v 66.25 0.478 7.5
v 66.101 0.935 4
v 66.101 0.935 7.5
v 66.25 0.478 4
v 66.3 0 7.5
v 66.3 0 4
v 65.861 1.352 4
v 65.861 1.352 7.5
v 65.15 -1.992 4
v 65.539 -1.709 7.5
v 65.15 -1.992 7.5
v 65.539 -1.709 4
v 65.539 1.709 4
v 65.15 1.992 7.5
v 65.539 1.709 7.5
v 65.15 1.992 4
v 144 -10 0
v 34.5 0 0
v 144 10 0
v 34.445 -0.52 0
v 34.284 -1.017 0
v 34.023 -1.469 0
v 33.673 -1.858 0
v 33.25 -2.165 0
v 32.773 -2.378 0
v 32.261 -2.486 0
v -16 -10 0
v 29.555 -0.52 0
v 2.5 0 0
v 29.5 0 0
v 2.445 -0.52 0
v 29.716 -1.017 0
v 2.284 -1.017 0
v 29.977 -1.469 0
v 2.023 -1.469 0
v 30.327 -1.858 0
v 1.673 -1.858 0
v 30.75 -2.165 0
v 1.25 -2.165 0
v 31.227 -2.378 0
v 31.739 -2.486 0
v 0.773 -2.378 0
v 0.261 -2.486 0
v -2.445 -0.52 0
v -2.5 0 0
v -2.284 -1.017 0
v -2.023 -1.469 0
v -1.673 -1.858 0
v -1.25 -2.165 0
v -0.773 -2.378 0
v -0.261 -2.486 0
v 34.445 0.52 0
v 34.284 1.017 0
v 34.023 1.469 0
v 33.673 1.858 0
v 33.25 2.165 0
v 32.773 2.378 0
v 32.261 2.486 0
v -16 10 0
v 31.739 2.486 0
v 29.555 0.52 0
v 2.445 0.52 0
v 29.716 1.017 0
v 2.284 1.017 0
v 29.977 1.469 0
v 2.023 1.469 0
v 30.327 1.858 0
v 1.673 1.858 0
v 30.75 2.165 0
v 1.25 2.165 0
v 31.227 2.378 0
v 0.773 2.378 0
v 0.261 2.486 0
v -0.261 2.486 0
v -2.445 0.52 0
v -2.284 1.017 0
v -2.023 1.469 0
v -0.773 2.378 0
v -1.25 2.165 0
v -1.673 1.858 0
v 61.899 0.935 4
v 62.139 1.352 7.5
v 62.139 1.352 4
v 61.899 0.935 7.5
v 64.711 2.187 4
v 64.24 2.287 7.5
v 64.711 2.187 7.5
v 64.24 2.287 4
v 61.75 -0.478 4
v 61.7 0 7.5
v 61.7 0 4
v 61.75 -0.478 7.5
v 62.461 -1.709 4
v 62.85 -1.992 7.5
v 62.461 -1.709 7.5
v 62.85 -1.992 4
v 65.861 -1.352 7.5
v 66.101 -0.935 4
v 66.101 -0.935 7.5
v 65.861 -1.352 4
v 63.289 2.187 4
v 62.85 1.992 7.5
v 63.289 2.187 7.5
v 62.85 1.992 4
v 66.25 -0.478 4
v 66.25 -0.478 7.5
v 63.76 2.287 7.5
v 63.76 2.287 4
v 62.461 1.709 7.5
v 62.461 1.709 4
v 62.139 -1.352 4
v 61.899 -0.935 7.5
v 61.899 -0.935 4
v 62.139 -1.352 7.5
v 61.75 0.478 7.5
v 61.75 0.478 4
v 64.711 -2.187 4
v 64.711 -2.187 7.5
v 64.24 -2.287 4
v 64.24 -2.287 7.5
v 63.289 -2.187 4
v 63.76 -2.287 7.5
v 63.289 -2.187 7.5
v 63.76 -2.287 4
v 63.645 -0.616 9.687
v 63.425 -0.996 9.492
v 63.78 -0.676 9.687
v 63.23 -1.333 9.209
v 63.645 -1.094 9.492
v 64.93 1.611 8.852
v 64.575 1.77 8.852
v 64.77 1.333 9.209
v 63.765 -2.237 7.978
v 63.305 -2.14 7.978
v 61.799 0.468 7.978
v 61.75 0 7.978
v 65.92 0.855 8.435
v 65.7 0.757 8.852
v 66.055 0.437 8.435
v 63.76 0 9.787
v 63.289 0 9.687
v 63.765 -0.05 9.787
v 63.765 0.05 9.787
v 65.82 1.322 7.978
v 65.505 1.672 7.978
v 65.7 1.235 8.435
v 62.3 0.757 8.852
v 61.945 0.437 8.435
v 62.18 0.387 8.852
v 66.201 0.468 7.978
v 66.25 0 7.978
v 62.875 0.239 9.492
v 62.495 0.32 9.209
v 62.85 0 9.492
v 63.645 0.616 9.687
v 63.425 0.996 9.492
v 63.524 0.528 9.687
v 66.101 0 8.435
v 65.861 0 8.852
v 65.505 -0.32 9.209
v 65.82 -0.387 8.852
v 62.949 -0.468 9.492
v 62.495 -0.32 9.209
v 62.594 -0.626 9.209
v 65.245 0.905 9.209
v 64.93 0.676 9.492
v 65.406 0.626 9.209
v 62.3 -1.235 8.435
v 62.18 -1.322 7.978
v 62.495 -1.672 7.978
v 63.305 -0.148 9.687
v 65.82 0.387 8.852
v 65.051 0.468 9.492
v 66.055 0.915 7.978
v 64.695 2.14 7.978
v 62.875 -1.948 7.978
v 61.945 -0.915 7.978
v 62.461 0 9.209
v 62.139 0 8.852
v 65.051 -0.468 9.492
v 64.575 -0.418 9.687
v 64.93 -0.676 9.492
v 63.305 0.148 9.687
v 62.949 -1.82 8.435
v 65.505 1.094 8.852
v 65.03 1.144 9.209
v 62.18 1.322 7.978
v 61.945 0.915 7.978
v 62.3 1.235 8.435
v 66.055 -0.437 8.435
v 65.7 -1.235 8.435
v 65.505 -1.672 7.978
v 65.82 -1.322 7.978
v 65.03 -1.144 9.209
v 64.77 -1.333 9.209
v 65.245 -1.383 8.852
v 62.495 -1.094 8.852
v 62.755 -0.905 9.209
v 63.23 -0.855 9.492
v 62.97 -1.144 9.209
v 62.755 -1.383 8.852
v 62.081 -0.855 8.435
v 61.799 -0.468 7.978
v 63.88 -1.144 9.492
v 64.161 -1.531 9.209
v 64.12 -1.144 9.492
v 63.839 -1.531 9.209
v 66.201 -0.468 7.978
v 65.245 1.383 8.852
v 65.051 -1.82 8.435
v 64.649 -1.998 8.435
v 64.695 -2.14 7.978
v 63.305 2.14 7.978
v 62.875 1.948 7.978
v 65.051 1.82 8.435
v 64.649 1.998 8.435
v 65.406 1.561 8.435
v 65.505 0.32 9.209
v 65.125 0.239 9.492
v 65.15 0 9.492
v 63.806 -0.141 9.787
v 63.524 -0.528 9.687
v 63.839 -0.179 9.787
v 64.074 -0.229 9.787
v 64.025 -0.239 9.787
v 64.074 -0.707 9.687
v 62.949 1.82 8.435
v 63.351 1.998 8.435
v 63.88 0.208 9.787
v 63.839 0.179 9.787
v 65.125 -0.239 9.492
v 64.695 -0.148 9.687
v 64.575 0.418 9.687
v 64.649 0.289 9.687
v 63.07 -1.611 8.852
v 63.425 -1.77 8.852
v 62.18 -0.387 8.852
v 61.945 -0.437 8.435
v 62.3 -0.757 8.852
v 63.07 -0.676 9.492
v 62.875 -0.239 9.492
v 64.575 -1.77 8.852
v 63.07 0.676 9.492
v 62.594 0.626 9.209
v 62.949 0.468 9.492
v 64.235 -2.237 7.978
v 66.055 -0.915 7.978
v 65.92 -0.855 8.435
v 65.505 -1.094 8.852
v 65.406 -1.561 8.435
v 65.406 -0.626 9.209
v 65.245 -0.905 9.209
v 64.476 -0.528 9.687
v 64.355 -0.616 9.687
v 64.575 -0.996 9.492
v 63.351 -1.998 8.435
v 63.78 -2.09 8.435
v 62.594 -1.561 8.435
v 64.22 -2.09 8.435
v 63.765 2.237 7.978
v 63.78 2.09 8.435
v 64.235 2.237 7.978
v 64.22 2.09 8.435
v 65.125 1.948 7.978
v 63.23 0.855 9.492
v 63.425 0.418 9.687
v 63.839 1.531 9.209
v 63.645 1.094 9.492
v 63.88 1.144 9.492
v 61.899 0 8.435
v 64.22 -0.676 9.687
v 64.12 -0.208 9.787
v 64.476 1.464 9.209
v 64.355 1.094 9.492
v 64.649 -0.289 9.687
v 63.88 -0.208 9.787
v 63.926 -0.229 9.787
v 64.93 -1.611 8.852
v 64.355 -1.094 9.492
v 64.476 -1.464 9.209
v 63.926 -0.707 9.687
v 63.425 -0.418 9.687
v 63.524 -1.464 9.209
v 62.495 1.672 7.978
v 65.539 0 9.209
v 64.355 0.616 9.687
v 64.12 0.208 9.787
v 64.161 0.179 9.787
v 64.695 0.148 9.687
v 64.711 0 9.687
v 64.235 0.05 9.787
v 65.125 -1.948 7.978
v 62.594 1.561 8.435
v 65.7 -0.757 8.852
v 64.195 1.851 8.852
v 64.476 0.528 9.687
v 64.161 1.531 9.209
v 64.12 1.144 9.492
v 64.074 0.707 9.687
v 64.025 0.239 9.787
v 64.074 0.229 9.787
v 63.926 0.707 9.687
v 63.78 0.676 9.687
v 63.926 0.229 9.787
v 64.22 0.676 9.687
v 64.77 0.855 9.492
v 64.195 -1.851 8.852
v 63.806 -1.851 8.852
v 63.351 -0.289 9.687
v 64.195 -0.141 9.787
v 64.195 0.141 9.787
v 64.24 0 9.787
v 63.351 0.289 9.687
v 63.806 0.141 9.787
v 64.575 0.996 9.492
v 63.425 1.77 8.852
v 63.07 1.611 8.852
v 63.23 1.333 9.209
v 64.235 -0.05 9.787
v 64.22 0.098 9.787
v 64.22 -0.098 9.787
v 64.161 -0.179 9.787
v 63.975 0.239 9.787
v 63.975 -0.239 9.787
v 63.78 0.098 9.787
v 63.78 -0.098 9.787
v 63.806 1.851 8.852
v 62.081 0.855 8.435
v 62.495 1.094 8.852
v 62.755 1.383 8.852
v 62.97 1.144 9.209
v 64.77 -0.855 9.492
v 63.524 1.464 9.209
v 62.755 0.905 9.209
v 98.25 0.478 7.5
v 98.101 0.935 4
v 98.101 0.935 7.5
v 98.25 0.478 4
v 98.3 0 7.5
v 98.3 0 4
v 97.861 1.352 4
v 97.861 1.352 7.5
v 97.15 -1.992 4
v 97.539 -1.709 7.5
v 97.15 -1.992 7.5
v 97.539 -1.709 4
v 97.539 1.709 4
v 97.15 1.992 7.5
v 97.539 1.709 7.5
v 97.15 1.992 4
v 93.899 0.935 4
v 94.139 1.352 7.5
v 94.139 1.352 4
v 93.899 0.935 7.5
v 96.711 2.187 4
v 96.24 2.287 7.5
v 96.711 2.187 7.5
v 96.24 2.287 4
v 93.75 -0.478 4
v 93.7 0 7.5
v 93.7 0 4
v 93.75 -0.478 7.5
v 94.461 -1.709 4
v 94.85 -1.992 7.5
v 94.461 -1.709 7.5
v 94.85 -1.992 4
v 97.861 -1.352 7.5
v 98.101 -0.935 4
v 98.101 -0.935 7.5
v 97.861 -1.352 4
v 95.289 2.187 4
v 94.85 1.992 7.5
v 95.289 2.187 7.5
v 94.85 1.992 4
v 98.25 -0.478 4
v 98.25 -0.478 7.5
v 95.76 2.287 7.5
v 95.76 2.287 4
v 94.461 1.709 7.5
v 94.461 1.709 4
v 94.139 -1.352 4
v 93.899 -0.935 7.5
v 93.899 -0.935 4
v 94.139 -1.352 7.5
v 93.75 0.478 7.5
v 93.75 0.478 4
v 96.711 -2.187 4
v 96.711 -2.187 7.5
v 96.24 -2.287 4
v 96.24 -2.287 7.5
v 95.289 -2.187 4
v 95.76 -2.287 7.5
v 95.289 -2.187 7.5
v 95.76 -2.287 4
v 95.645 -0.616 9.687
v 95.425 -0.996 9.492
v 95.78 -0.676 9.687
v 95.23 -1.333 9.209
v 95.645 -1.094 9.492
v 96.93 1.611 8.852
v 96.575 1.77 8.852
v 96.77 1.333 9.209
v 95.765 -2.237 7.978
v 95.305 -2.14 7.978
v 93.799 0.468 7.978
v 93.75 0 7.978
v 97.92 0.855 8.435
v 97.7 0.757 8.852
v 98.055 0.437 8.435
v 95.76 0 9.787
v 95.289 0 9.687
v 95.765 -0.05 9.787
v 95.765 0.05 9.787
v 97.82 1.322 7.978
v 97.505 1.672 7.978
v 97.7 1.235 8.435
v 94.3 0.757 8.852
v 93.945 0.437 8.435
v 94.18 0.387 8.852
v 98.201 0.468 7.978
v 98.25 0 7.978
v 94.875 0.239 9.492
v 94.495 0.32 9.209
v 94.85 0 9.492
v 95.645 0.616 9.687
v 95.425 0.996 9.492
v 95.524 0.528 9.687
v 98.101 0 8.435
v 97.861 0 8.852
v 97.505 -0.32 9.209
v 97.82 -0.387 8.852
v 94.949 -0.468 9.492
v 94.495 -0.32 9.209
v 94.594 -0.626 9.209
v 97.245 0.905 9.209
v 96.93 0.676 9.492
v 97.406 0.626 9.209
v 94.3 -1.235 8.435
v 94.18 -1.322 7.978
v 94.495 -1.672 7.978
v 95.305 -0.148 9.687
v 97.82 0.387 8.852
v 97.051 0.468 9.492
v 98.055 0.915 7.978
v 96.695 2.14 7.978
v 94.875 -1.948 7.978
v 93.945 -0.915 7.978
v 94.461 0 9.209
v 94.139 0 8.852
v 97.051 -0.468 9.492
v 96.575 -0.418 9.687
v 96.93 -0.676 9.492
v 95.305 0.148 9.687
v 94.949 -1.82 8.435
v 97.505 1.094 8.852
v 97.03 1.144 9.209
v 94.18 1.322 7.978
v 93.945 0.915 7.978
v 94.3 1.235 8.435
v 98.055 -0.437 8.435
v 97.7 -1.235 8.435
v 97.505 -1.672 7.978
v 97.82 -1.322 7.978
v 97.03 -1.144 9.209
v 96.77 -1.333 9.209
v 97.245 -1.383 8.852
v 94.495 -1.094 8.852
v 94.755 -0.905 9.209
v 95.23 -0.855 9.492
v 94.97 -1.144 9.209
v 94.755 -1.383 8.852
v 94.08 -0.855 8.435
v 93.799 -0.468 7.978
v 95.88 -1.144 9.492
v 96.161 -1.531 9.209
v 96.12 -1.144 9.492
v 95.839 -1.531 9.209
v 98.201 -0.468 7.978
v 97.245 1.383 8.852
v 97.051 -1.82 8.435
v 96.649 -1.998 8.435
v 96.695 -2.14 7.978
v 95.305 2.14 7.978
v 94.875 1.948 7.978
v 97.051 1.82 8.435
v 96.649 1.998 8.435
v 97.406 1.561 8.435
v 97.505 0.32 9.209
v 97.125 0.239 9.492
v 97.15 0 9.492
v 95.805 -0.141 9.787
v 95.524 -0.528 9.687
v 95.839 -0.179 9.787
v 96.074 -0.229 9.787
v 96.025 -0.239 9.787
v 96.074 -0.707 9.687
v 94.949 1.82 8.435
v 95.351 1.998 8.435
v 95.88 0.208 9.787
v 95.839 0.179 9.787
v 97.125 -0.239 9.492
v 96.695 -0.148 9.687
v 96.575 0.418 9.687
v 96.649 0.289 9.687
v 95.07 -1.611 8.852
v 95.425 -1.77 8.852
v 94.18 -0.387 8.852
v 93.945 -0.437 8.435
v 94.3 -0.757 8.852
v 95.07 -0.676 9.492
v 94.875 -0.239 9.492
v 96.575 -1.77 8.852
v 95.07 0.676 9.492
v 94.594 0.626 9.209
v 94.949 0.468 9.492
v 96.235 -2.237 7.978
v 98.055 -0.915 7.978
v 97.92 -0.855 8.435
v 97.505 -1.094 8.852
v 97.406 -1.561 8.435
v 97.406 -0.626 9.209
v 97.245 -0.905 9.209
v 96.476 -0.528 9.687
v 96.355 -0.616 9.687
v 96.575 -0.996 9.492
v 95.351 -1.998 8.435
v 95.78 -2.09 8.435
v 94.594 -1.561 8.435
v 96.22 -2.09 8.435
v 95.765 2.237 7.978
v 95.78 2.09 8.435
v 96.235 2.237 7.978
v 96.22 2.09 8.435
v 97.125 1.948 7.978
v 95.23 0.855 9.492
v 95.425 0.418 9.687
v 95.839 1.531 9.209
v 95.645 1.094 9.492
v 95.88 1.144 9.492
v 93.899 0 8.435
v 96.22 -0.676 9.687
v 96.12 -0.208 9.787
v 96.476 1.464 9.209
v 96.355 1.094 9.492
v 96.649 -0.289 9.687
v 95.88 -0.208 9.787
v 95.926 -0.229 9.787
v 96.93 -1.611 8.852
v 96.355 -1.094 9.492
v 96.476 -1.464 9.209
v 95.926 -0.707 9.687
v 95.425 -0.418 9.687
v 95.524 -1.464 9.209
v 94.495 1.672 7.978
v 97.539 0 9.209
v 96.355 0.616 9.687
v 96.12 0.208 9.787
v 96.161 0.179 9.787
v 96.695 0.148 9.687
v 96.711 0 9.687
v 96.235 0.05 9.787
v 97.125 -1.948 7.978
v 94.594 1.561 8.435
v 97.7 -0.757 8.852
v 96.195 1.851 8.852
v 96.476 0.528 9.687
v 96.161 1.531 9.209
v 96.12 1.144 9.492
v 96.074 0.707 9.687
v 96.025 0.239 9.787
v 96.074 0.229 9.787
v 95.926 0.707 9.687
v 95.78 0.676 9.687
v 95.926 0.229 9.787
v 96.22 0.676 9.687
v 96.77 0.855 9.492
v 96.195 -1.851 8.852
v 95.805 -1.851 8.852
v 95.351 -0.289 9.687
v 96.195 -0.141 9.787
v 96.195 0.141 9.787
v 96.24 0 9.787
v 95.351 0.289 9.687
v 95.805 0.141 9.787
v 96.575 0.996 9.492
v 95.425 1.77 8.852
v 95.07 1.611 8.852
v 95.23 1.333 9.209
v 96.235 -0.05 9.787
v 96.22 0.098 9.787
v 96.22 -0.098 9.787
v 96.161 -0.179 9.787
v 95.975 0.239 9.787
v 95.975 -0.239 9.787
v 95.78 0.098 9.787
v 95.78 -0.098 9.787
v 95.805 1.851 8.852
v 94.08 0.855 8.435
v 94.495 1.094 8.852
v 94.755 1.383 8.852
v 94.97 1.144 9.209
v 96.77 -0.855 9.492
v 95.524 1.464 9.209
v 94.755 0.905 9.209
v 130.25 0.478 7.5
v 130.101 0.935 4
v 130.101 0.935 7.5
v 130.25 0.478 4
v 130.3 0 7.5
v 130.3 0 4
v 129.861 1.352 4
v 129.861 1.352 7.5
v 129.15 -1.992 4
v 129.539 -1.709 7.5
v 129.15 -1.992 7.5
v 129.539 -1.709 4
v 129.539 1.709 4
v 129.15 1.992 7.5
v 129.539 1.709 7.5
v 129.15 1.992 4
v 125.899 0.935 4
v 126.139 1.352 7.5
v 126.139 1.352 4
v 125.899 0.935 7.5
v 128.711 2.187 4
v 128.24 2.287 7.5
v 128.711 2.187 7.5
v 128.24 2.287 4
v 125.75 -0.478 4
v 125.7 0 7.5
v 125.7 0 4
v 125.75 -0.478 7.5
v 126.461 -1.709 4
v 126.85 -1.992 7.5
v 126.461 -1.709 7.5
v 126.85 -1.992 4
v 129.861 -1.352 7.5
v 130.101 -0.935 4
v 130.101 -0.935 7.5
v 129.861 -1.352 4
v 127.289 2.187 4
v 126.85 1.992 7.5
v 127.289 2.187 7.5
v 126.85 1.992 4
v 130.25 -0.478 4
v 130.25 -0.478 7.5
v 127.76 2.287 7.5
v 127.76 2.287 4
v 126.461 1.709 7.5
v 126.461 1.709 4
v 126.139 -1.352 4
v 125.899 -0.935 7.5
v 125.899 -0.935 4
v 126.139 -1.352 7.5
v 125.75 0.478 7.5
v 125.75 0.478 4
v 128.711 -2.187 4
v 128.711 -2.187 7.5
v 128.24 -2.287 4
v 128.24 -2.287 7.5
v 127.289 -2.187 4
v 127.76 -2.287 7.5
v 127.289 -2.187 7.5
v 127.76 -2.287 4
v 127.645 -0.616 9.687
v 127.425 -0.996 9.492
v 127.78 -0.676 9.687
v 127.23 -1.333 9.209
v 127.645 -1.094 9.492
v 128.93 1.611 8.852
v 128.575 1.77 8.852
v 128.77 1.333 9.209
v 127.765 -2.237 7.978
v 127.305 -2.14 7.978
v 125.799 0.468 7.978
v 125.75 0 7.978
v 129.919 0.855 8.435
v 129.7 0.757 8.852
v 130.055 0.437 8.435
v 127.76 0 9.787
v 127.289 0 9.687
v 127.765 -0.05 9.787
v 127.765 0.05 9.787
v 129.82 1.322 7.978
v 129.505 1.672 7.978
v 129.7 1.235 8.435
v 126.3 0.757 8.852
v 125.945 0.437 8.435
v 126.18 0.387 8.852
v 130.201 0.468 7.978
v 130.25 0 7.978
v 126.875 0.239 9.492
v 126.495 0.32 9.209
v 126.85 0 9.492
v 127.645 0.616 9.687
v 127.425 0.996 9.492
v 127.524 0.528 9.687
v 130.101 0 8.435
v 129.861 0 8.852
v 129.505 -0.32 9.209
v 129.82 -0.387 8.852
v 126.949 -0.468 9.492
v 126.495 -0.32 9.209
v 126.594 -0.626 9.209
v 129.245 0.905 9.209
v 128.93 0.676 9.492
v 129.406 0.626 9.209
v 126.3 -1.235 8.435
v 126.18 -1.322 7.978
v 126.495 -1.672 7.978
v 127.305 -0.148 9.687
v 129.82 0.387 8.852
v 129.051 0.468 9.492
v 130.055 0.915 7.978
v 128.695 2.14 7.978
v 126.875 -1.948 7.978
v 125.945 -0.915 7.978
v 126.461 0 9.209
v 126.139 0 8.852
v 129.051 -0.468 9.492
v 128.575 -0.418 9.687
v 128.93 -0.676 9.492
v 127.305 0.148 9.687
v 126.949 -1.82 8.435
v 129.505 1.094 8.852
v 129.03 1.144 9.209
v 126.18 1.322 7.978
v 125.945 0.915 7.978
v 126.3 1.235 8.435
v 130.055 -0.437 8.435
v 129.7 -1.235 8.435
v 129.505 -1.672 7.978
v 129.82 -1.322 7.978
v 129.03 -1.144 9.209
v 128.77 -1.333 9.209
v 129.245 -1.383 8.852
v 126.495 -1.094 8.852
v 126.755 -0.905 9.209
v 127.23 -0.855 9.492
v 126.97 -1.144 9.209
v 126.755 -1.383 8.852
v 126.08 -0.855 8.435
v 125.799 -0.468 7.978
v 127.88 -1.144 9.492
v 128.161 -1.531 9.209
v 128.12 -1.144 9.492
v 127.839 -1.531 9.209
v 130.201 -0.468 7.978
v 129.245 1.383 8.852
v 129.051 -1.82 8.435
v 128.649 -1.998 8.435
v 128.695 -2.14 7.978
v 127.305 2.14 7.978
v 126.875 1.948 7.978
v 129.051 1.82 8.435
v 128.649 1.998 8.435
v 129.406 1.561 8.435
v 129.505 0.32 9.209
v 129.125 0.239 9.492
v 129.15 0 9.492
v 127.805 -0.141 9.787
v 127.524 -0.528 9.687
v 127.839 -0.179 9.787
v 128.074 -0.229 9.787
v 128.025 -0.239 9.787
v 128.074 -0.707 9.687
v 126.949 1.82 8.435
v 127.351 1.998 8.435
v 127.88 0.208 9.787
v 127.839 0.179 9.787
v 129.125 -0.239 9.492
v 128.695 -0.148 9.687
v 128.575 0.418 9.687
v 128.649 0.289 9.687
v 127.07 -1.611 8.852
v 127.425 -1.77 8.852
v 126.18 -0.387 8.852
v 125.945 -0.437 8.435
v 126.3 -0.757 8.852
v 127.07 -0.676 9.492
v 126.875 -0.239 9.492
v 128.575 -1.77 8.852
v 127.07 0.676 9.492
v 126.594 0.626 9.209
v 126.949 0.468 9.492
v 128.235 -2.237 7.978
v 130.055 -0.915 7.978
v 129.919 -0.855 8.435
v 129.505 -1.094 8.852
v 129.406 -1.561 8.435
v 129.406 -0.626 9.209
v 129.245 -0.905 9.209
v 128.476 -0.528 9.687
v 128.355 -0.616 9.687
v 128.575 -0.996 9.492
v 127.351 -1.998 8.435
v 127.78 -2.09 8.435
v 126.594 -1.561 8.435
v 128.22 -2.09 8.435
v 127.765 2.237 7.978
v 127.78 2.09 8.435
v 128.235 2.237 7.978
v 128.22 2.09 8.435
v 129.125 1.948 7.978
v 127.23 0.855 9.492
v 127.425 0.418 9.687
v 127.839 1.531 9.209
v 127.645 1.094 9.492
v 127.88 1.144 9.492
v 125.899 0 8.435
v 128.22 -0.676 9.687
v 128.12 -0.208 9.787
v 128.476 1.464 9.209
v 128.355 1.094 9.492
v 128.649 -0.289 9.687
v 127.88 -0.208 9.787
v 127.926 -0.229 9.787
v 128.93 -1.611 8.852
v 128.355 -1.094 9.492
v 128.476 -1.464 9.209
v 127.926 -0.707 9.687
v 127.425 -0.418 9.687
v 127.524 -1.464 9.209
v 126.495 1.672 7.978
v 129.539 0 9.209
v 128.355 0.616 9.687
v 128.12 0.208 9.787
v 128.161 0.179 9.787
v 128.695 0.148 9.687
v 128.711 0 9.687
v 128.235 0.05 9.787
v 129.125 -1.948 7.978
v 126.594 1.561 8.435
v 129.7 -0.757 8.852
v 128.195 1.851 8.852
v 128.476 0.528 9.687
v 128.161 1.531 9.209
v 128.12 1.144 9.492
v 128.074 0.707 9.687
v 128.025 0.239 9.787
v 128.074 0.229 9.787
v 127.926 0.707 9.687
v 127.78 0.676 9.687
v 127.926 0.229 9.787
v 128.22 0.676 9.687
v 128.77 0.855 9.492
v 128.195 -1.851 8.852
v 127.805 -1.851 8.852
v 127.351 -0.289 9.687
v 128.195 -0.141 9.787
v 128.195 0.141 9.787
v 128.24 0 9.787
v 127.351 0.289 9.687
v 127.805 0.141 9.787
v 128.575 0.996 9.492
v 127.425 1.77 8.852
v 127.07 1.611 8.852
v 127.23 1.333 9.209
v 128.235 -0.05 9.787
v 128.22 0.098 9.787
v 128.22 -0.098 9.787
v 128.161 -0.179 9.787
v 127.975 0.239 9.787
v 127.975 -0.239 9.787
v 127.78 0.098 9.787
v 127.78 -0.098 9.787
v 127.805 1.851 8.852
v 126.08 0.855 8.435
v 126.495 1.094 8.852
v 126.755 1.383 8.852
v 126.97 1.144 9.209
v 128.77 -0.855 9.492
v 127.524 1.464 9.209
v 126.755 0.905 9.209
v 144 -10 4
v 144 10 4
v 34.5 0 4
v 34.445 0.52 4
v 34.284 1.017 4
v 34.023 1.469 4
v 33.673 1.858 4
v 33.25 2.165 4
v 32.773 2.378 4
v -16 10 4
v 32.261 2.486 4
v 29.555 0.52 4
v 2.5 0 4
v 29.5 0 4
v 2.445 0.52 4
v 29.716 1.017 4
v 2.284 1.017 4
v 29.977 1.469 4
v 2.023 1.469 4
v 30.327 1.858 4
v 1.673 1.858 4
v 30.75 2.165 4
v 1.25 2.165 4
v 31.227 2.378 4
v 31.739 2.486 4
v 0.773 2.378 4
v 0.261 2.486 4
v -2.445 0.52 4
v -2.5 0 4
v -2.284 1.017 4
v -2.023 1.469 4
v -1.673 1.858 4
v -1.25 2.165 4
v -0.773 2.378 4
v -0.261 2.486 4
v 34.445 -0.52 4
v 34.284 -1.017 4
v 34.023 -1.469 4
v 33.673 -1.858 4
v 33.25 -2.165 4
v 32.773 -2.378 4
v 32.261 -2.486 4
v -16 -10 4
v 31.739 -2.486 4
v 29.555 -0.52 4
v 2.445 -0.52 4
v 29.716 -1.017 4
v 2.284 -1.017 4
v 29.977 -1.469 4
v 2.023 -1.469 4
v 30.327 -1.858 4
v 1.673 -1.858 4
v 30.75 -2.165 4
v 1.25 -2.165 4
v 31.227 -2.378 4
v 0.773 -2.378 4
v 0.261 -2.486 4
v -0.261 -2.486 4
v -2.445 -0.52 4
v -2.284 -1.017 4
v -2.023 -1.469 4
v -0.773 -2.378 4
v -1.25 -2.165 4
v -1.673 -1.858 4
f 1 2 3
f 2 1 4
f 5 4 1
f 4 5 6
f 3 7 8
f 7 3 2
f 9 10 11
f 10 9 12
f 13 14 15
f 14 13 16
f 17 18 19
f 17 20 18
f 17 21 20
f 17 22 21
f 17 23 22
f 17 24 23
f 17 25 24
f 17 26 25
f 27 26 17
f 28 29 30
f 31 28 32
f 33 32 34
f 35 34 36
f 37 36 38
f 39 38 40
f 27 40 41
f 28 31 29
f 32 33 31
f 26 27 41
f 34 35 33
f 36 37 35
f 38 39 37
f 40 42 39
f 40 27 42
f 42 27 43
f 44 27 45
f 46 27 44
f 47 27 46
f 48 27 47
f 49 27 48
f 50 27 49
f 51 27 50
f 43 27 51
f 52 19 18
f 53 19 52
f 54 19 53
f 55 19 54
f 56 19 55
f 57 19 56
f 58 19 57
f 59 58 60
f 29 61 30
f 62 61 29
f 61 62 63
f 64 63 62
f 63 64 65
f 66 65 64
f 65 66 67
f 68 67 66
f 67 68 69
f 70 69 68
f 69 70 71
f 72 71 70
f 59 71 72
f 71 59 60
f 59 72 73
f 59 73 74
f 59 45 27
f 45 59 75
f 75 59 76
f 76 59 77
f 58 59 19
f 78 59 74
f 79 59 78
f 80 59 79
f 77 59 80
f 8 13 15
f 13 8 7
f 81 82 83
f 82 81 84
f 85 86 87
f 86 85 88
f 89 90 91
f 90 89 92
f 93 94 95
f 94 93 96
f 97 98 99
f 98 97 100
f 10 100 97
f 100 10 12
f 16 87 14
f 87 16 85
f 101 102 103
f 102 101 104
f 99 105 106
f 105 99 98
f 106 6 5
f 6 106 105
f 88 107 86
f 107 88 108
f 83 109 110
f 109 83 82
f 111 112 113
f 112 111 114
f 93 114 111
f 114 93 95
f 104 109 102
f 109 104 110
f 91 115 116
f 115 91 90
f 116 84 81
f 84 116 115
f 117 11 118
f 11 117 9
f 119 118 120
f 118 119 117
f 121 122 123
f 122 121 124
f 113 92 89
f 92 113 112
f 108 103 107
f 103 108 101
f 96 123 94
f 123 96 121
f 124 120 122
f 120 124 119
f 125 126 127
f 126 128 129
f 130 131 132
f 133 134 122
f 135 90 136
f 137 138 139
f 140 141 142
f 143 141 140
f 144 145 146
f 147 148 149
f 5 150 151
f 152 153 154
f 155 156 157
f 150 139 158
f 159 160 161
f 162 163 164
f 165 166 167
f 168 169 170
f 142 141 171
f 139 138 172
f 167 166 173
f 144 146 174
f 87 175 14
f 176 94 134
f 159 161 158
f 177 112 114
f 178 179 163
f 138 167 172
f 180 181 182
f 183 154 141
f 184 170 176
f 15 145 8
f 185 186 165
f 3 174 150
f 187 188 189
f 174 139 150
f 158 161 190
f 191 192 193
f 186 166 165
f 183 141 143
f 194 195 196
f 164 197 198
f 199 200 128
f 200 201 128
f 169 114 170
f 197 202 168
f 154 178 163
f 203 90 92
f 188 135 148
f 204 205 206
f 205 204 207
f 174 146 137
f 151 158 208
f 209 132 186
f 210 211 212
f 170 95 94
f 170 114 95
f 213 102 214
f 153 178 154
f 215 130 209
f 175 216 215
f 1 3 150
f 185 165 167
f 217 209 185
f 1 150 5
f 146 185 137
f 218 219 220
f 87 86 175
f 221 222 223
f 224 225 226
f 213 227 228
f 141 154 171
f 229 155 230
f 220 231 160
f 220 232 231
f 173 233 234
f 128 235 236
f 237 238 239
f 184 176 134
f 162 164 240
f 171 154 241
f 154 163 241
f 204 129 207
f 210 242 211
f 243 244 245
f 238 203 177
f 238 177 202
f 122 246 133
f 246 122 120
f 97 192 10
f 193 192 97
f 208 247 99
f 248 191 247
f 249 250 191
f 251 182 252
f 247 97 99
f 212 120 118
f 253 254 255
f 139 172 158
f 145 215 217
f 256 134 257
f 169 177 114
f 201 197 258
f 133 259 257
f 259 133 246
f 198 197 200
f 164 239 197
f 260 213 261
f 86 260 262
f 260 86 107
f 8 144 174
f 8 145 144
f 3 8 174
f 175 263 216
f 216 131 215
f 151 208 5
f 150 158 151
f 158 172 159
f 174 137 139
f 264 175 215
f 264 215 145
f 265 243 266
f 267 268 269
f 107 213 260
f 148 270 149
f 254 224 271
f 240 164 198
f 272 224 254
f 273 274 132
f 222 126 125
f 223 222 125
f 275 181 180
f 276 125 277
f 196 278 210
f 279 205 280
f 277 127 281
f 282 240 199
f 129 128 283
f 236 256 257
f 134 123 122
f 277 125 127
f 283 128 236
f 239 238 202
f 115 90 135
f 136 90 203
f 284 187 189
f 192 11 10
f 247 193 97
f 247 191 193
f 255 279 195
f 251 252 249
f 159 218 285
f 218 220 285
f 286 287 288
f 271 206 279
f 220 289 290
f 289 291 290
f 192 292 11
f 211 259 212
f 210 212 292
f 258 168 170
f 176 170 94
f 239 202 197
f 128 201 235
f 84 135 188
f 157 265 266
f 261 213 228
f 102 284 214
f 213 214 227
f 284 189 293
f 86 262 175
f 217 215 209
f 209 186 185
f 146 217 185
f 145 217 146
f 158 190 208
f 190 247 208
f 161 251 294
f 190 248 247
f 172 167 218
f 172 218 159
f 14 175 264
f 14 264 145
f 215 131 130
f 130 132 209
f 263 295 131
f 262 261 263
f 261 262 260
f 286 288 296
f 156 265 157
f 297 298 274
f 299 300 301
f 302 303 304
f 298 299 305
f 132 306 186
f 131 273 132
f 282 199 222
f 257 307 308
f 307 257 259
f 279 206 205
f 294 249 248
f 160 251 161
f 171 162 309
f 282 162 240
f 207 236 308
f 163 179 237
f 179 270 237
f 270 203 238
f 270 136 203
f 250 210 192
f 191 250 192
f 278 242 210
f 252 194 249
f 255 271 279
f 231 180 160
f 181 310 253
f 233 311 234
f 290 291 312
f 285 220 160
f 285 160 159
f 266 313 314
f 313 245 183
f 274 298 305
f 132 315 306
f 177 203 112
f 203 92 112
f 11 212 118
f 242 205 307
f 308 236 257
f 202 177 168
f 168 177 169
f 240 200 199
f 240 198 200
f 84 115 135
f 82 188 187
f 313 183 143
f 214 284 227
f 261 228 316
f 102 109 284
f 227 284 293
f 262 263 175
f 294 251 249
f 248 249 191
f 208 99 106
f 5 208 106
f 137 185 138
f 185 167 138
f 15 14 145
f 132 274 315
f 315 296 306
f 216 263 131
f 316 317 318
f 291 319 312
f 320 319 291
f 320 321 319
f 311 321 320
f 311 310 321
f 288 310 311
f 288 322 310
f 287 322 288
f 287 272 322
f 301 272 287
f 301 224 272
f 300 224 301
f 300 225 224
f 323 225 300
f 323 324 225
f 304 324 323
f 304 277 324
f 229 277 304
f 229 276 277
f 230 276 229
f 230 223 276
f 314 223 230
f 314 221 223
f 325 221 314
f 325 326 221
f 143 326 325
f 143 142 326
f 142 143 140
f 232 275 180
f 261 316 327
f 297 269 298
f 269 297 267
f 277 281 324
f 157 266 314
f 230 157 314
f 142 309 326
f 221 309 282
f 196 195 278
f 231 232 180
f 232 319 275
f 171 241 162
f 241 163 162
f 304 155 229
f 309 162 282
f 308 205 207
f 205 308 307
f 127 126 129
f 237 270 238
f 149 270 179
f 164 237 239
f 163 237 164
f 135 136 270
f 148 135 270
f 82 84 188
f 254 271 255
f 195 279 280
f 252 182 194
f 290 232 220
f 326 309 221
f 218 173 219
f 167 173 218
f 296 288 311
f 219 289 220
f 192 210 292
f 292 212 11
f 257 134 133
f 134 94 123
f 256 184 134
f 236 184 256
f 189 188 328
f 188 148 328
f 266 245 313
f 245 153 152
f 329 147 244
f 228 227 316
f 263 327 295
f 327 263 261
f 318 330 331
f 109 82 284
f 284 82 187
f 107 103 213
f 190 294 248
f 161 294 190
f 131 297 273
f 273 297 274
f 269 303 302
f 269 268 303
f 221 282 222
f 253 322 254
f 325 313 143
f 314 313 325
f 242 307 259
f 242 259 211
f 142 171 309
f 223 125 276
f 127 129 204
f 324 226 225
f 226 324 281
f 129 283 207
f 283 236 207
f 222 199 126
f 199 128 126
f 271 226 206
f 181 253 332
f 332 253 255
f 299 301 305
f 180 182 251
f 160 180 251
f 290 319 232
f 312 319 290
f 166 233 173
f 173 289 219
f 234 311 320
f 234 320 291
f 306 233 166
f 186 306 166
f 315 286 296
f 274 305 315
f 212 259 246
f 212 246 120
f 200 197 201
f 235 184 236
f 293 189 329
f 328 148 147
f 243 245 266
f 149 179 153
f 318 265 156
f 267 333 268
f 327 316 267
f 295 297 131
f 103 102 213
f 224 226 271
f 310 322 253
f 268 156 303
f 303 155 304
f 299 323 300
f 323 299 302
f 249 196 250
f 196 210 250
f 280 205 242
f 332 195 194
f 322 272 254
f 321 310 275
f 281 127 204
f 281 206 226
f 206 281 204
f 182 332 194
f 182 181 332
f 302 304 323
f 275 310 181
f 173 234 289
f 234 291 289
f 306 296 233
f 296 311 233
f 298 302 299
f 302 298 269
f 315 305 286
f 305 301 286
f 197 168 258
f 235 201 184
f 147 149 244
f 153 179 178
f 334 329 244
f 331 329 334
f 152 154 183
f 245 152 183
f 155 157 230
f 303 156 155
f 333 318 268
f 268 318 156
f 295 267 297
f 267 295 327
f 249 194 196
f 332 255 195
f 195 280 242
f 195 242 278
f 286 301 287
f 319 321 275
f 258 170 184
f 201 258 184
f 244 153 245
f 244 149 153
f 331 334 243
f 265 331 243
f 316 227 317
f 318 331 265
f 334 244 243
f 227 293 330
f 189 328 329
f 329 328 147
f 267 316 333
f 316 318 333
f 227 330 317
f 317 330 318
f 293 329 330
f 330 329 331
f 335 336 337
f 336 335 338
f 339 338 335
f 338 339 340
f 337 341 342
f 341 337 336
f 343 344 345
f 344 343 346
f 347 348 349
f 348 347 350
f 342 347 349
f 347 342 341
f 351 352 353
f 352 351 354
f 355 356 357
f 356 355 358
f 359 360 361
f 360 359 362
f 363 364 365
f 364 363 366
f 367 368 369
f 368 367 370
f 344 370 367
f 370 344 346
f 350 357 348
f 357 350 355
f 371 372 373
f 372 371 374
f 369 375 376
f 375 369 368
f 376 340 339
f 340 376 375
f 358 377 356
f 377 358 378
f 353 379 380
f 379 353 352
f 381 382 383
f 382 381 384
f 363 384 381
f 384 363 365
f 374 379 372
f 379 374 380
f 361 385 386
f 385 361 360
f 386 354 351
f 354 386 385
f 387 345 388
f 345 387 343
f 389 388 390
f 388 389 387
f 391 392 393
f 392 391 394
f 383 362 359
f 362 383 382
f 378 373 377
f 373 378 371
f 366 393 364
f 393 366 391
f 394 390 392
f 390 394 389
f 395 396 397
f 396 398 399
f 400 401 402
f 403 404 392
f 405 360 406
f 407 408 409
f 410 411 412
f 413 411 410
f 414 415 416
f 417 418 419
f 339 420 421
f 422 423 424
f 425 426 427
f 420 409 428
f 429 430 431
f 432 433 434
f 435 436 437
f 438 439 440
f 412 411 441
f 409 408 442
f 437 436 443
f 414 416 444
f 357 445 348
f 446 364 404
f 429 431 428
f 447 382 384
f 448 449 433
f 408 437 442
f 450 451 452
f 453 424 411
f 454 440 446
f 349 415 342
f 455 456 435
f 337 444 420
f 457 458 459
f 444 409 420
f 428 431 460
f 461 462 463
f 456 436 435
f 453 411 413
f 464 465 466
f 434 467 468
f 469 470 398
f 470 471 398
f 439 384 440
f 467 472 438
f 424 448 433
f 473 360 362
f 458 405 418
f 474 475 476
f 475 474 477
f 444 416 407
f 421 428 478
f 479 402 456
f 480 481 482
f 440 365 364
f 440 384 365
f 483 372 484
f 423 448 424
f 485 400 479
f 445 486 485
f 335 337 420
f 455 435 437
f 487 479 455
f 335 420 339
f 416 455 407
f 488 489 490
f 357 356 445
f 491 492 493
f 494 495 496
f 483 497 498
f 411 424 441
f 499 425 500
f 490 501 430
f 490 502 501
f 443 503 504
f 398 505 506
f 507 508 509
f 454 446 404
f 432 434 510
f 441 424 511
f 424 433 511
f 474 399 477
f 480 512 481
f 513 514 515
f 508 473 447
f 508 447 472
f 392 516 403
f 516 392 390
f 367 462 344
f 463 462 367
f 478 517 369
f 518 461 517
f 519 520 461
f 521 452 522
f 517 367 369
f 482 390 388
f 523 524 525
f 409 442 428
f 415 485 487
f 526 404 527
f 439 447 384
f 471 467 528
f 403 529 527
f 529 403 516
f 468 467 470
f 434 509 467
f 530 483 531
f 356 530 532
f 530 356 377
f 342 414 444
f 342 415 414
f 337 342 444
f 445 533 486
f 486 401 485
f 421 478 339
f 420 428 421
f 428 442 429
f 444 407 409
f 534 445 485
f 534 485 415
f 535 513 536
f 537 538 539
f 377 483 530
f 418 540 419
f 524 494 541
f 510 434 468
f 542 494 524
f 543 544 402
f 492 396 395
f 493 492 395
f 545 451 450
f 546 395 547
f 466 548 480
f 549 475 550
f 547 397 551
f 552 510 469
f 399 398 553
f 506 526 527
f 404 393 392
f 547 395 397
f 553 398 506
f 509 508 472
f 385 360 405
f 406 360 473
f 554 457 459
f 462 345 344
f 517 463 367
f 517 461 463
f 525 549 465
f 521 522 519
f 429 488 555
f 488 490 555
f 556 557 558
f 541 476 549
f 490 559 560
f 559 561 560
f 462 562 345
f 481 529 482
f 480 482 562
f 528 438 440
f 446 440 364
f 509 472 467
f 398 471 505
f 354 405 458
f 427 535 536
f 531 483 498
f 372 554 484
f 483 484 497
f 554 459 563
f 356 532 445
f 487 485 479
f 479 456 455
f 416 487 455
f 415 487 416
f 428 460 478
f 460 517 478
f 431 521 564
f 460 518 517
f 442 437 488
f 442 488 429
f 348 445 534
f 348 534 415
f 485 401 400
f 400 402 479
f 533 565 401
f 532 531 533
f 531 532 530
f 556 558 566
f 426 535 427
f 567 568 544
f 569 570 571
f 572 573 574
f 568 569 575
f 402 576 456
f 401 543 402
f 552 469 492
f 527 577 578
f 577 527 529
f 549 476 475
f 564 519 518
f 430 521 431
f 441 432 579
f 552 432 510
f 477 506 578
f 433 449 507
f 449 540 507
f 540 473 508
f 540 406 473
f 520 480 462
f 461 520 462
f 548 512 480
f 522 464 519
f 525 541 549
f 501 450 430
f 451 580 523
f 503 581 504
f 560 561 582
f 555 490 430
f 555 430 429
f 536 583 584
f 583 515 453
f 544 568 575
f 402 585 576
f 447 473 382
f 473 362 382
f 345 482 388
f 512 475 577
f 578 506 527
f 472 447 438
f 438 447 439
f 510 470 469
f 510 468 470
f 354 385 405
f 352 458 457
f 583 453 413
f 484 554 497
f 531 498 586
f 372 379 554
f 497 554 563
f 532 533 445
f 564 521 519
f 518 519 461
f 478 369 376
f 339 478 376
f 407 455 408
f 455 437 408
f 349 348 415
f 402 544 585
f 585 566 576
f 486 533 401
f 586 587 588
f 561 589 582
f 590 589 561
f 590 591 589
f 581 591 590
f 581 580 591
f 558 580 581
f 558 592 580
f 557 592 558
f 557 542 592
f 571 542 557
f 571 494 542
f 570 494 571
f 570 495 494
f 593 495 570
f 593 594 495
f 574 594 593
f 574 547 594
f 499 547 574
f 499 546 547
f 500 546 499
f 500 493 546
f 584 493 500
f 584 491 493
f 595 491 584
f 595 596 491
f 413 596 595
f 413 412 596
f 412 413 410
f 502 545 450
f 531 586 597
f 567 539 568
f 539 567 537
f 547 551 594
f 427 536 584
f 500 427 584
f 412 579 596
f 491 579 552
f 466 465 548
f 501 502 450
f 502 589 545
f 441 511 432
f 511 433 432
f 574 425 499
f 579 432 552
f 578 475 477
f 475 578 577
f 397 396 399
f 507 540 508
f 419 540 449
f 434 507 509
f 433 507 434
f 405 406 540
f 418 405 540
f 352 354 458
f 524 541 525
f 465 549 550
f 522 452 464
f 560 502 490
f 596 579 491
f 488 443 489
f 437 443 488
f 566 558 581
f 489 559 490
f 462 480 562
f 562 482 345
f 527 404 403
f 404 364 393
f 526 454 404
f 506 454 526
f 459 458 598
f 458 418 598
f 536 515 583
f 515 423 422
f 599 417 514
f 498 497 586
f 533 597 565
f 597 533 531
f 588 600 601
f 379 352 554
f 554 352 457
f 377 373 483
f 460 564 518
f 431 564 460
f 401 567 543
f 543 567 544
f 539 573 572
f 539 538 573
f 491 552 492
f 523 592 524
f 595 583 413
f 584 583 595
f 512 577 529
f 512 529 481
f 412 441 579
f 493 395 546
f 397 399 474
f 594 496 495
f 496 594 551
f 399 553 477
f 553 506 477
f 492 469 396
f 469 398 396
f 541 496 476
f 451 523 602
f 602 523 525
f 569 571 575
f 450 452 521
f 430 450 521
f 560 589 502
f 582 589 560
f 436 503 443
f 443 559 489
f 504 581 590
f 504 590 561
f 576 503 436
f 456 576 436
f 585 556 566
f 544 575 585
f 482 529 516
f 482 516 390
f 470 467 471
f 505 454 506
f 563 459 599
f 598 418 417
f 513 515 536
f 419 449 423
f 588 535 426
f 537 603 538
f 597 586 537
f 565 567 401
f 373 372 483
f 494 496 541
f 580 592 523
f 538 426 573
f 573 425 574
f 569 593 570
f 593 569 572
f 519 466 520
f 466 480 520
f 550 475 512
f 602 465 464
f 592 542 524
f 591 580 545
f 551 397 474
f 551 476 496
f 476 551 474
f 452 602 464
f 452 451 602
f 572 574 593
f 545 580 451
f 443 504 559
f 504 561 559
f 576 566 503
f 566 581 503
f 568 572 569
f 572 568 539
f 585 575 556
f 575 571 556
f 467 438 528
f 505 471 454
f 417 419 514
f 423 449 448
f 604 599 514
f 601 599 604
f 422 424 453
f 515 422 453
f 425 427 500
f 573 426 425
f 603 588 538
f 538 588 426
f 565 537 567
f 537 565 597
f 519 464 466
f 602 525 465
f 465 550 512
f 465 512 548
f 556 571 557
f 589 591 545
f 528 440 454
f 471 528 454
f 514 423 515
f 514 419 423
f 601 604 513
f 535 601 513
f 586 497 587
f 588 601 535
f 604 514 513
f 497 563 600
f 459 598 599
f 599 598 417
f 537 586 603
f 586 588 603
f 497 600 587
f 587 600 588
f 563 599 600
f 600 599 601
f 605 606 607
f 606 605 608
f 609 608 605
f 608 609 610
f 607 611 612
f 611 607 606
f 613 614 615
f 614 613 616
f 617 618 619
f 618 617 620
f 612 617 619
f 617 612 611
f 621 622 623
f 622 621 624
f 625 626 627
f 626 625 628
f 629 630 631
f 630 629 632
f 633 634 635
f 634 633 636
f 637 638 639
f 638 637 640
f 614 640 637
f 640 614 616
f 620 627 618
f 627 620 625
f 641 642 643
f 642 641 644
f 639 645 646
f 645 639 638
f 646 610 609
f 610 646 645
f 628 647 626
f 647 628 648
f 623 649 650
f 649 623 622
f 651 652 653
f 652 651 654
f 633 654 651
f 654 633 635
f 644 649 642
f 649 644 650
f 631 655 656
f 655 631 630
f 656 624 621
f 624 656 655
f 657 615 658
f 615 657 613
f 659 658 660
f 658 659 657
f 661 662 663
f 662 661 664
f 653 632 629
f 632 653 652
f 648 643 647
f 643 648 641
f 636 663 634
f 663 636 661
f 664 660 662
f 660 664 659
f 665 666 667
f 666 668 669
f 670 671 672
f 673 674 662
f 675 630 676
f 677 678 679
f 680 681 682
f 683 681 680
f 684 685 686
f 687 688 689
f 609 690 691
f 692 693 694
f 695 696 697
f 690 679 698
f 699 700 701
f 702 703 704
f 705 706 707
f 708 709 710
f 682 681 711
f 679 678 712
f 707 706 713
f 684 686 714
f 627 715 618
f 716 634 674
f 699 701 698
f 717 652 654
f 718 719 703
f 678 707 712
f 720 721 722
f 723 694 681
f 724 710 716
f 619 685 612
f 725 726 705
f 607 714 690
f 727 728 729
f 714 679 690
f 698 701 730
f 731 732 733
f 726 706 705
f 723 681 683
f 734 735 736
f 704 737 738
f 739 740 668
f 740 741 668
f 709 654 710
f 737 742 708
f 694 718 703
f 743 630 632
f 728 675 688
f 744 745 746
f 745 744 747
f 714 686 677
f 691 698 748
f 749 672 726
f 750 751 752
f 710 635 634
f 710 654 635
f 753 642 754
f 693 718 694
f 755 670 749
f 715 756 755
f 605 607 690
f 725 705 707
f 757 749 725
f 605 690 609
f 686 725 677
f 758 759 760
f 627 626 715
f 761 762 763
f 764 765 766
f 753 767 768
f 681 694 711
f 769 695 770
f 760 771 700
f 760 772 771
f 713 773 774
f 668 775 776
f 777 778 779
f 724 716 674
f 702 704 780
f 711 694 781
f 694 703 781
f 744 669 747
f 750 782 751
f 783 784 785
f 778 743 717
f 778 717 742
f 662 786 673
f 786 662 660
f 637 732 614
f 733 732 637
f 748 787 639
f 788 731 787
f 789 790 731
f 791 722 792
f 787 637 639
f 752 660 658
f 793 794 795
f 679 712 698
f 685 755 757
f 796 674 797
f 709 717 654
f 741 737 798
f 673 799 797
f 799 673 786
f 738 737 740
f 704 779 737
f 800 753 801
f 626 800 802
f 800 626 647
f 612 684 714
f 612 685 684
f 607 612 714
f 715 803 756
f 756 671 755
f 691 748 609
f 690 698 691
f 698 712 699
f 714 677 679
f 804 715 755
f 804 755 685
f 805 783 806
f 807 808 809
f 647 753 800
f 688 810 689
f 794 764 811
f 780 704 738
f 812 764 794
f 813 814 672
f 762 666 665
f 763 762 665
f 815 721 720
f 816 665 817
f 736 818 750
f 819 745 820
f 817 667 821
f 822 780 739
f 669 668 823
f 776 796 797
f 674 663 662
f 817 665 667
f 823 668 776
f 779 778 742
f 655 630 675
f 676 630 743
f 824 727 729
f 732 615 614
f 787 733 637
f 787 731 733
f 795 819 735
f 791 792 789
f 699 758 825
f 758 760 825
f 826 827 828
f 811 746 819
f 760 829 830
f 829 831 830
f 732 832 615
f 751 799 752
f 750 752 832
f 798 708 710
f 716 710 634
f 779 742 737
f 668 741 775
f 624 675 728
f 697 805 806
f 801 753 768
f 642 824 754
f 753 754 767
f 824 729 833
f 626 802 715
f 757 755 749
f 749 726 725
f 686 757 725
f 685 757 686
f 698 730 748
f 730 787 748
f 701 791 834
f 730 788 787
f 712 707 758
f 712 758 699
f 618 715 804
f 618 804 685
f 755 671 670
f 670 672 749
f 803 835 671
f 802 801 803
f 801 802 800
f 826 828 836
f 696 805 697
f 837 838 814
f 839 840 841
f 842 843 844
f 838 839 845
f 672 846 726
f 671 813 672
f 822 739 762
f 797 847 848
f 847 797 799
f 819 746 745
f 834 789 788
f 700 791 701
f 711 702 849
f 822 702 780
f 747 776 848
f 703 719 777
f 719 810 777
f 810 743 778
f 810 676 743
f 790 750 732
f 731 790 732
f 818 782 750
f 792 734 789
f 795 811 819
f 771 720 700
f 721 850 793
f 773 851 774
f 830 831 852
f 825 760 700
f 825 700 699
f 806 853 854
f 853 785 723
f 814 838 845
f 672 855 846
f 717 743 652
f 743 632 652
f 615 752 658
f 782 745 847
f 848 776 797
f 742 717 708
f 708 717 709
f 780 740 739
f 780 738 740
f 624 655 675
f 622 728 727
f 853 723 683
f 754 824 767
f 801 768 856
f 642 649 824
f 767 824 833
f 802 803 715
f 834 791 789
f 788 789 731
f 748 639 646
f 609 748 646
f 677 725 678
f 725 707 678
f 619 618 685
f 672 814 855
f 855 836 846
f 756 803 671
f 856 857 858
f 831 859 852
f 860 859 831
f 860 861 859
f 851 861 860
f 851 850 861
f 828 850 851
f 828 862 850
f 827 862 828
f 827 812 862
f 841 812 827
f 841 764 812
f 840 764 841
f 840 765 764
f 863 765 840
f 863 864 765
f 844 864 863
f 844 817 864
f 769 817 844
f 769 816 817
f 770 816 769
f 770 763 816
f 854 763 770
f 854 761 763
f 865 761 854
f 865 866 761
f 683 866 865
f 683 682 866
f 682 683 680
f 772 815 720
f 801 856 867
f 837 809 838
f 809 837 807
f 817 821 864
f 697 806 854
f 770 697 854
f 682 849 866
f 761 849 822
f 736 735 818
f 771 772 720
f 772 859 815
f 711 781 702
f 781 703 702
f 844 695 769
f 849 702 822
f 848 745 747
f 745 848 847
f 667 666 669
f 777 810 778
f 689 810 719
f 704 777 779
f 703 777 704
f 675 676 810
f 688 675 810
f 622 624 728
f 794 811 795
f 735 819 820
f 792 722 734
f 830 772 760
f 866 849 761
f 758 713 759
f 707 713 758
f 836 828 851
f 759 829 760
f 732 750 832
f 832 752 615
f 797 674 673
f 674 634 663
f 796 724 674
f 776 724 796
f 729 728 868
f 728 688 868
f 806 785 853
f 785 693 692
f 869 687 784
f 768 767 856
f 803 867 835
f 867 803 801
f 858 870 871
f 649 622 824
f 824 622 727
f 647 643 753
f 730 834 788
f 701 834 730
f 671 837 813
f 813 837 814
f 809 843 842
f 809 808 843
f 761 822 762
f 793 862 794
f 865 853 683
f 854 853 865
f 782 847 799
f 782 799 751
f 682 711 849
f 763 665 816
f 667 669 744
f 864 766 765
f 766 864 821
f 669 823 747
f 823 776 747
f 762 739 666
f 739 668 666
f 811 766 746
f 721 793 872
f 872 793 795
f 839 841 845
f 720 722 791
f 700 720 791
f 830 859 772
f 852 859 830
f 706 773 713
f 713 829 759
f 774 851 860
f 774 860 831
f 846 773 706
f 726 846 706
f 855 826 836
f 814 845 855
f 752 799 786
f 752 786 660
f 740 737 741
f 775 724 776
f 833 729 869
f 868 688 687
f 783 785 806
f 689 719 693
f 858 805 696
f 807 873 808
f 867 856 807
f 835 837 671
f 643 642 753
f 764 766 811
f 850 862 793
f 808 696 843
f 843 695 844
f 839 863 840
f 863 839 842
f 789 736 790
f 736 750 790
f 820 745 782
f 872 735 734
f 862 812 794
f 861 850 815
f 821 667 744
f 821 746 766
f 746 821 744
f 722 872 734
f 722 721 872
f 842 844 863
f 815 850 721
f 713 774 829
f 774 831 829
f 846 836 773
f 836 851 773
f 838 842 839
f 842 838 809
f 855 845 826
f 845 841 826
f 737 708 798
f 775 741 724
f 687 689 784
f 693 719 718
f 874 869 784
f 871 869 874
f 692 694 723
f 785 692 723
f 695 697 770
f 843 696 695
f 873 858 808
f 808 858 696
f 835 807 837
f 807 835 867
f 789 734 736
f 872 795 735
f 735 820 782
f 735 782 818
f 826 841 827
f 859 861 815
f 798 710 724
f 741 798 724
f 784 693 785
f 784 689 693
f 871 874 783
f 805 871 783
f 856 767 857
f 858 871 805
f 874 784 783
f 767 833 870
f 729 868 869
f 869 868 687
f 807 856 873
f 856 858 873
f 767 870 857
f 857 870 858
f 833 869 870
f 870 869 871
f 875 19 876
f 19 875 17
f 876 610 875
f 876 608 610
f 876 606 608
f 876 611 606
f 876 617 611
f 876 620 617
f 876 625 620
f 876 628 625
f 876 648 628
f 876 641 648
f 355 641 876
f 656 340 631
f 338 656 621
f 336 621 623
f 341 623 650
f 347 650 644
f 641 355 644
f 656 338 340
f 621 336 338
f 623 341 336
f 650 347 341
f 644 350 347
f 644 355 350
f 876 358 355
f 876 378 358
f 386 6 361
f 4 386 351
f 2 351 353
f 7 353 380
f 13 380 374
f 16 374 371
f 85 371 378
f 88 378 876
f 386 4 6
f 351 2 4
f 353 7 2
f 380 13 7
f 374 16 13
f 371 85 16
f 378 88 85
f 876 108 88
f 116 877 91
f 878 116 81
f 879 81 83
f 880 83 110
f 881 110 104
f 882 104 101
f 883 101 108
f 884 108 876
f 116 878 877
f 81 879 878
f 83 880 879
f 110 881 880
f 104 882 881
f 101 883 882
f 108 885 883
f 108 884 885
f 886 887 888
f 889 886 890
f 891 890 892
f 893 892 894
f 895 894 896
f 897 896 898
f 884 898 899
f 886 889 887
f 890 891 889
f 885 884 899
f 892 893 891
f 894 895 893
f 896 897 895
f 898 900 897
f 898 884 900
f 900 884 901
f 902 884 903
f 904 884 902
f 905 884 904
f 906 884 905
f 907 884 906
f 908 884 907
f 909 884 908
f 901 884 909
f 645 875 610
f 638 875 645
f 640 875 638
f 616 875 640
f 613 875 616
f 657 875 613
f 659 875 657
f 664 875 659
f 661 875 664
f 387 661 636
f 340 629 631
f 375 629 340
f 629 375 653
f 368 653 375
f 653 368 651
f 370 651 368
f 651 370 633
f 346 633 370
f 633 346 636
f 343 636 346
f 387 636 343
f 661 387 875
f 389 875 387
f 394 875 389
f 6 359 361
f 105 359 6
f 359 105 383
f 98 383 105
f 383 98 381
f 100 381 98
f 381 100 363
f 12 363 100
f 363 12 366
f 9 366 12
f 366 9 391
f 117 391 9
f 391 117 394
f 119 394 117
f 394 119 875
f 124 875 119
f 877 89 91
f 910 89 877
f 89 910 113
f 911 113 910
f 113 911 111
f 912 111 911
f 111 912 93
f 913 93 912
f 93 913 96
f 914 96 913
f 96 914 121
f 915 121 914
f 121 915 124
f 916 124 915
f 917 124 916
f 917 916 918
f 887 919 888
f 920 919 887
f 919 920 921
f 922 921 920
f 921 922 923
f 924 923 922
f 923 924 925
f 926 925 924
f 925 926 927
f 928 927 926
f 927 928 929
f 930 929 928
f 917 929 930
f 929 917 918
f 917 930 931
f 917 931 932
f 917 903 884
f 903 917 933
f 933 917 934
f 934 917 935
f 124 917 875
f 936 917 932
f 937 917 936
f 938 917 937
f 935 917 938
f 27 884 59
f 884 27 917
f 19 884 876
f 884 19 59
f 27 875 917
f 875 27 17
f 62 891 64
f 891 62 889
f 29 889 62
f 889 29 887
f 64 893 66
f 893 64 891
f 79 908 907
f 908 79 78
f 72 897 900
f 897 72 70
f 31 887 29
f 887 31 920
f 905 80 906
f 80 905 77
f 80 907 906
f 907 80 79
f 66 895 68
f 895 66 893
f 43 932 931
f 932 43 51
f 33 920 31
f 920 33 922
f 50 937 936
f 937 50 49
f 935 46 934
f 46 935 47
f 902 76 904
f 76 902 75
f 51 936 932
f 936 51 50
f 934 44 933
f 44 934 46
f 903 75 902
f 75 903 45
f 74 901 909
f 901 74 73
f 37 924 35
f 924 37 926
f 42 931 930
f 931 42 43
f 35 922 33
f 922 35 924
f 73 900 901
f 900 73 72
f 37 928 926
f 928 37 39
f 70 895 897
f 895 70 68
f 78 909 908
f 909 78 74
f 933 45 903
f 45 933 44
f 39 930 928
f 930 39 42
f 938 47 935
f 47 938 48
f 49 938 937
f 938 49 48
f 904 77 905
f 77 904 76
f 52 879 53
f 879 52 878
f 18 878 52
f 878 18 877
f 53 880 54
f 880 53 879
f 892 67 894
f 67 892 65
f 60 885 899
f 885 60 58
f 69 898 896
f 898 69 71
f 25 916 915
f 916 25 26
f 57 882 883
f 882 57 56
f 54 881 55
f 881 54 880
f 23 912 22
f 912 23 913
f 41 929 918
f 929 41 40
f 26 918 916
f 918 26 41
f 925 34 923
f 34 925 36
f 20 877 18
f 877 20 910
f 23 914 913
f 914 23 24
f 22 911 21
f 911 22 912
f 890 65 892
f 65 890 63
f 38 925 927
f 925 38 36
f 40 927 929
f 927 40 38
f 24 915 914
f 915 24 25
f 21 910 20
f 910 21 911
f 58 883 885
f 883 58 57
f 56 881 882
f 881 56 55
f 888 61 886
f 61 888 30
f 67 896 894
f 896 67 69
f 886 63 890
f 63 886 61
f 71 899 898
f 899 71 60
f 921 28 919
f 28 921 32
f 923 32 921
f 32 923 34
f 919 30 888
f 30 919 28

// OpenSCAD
//
//   jig for drilling extra holes in old Billy shelves and so on
//
//   design by Egil Kvaleberg, 5 December 2016
//

// hole and peg diameter
hdia = 5.0;

// length of peg
hdepth = 6.0;

// jig thickness
wall = 4.0;

// number of pegs
pegs = 3;
// number of holes (for drilling)
holes = 2;

// distance between holes
hdist = 32.0;

width = 4*hdia;

// tolerance
tol = 0.2;
d = 1*0.01;

module peg()
{
    cylinder(d=hdia-2*tol, h=wall+hdepth-hdia/2, $fn=30);
    translate([0,0,wall+hdepth-hdia/2]) sphere(d=hdia-2*tol, $fn=30);
}

difference () {
    union () {
        translate([-hdist/2,-width/2,0]) cube([(pegs+holes)*hdist,width,wall]);
        for (n = [holes:holes+pegs-1]) translate([n*hdist,0,0]) 
            peg();
    }
    union () {
        for (n = [0:holes-1]) translate([n*hdist,0,-d]) 
            cylinder(d=hdia, h=2*wall+2*d, $fn=30);
    }
}
